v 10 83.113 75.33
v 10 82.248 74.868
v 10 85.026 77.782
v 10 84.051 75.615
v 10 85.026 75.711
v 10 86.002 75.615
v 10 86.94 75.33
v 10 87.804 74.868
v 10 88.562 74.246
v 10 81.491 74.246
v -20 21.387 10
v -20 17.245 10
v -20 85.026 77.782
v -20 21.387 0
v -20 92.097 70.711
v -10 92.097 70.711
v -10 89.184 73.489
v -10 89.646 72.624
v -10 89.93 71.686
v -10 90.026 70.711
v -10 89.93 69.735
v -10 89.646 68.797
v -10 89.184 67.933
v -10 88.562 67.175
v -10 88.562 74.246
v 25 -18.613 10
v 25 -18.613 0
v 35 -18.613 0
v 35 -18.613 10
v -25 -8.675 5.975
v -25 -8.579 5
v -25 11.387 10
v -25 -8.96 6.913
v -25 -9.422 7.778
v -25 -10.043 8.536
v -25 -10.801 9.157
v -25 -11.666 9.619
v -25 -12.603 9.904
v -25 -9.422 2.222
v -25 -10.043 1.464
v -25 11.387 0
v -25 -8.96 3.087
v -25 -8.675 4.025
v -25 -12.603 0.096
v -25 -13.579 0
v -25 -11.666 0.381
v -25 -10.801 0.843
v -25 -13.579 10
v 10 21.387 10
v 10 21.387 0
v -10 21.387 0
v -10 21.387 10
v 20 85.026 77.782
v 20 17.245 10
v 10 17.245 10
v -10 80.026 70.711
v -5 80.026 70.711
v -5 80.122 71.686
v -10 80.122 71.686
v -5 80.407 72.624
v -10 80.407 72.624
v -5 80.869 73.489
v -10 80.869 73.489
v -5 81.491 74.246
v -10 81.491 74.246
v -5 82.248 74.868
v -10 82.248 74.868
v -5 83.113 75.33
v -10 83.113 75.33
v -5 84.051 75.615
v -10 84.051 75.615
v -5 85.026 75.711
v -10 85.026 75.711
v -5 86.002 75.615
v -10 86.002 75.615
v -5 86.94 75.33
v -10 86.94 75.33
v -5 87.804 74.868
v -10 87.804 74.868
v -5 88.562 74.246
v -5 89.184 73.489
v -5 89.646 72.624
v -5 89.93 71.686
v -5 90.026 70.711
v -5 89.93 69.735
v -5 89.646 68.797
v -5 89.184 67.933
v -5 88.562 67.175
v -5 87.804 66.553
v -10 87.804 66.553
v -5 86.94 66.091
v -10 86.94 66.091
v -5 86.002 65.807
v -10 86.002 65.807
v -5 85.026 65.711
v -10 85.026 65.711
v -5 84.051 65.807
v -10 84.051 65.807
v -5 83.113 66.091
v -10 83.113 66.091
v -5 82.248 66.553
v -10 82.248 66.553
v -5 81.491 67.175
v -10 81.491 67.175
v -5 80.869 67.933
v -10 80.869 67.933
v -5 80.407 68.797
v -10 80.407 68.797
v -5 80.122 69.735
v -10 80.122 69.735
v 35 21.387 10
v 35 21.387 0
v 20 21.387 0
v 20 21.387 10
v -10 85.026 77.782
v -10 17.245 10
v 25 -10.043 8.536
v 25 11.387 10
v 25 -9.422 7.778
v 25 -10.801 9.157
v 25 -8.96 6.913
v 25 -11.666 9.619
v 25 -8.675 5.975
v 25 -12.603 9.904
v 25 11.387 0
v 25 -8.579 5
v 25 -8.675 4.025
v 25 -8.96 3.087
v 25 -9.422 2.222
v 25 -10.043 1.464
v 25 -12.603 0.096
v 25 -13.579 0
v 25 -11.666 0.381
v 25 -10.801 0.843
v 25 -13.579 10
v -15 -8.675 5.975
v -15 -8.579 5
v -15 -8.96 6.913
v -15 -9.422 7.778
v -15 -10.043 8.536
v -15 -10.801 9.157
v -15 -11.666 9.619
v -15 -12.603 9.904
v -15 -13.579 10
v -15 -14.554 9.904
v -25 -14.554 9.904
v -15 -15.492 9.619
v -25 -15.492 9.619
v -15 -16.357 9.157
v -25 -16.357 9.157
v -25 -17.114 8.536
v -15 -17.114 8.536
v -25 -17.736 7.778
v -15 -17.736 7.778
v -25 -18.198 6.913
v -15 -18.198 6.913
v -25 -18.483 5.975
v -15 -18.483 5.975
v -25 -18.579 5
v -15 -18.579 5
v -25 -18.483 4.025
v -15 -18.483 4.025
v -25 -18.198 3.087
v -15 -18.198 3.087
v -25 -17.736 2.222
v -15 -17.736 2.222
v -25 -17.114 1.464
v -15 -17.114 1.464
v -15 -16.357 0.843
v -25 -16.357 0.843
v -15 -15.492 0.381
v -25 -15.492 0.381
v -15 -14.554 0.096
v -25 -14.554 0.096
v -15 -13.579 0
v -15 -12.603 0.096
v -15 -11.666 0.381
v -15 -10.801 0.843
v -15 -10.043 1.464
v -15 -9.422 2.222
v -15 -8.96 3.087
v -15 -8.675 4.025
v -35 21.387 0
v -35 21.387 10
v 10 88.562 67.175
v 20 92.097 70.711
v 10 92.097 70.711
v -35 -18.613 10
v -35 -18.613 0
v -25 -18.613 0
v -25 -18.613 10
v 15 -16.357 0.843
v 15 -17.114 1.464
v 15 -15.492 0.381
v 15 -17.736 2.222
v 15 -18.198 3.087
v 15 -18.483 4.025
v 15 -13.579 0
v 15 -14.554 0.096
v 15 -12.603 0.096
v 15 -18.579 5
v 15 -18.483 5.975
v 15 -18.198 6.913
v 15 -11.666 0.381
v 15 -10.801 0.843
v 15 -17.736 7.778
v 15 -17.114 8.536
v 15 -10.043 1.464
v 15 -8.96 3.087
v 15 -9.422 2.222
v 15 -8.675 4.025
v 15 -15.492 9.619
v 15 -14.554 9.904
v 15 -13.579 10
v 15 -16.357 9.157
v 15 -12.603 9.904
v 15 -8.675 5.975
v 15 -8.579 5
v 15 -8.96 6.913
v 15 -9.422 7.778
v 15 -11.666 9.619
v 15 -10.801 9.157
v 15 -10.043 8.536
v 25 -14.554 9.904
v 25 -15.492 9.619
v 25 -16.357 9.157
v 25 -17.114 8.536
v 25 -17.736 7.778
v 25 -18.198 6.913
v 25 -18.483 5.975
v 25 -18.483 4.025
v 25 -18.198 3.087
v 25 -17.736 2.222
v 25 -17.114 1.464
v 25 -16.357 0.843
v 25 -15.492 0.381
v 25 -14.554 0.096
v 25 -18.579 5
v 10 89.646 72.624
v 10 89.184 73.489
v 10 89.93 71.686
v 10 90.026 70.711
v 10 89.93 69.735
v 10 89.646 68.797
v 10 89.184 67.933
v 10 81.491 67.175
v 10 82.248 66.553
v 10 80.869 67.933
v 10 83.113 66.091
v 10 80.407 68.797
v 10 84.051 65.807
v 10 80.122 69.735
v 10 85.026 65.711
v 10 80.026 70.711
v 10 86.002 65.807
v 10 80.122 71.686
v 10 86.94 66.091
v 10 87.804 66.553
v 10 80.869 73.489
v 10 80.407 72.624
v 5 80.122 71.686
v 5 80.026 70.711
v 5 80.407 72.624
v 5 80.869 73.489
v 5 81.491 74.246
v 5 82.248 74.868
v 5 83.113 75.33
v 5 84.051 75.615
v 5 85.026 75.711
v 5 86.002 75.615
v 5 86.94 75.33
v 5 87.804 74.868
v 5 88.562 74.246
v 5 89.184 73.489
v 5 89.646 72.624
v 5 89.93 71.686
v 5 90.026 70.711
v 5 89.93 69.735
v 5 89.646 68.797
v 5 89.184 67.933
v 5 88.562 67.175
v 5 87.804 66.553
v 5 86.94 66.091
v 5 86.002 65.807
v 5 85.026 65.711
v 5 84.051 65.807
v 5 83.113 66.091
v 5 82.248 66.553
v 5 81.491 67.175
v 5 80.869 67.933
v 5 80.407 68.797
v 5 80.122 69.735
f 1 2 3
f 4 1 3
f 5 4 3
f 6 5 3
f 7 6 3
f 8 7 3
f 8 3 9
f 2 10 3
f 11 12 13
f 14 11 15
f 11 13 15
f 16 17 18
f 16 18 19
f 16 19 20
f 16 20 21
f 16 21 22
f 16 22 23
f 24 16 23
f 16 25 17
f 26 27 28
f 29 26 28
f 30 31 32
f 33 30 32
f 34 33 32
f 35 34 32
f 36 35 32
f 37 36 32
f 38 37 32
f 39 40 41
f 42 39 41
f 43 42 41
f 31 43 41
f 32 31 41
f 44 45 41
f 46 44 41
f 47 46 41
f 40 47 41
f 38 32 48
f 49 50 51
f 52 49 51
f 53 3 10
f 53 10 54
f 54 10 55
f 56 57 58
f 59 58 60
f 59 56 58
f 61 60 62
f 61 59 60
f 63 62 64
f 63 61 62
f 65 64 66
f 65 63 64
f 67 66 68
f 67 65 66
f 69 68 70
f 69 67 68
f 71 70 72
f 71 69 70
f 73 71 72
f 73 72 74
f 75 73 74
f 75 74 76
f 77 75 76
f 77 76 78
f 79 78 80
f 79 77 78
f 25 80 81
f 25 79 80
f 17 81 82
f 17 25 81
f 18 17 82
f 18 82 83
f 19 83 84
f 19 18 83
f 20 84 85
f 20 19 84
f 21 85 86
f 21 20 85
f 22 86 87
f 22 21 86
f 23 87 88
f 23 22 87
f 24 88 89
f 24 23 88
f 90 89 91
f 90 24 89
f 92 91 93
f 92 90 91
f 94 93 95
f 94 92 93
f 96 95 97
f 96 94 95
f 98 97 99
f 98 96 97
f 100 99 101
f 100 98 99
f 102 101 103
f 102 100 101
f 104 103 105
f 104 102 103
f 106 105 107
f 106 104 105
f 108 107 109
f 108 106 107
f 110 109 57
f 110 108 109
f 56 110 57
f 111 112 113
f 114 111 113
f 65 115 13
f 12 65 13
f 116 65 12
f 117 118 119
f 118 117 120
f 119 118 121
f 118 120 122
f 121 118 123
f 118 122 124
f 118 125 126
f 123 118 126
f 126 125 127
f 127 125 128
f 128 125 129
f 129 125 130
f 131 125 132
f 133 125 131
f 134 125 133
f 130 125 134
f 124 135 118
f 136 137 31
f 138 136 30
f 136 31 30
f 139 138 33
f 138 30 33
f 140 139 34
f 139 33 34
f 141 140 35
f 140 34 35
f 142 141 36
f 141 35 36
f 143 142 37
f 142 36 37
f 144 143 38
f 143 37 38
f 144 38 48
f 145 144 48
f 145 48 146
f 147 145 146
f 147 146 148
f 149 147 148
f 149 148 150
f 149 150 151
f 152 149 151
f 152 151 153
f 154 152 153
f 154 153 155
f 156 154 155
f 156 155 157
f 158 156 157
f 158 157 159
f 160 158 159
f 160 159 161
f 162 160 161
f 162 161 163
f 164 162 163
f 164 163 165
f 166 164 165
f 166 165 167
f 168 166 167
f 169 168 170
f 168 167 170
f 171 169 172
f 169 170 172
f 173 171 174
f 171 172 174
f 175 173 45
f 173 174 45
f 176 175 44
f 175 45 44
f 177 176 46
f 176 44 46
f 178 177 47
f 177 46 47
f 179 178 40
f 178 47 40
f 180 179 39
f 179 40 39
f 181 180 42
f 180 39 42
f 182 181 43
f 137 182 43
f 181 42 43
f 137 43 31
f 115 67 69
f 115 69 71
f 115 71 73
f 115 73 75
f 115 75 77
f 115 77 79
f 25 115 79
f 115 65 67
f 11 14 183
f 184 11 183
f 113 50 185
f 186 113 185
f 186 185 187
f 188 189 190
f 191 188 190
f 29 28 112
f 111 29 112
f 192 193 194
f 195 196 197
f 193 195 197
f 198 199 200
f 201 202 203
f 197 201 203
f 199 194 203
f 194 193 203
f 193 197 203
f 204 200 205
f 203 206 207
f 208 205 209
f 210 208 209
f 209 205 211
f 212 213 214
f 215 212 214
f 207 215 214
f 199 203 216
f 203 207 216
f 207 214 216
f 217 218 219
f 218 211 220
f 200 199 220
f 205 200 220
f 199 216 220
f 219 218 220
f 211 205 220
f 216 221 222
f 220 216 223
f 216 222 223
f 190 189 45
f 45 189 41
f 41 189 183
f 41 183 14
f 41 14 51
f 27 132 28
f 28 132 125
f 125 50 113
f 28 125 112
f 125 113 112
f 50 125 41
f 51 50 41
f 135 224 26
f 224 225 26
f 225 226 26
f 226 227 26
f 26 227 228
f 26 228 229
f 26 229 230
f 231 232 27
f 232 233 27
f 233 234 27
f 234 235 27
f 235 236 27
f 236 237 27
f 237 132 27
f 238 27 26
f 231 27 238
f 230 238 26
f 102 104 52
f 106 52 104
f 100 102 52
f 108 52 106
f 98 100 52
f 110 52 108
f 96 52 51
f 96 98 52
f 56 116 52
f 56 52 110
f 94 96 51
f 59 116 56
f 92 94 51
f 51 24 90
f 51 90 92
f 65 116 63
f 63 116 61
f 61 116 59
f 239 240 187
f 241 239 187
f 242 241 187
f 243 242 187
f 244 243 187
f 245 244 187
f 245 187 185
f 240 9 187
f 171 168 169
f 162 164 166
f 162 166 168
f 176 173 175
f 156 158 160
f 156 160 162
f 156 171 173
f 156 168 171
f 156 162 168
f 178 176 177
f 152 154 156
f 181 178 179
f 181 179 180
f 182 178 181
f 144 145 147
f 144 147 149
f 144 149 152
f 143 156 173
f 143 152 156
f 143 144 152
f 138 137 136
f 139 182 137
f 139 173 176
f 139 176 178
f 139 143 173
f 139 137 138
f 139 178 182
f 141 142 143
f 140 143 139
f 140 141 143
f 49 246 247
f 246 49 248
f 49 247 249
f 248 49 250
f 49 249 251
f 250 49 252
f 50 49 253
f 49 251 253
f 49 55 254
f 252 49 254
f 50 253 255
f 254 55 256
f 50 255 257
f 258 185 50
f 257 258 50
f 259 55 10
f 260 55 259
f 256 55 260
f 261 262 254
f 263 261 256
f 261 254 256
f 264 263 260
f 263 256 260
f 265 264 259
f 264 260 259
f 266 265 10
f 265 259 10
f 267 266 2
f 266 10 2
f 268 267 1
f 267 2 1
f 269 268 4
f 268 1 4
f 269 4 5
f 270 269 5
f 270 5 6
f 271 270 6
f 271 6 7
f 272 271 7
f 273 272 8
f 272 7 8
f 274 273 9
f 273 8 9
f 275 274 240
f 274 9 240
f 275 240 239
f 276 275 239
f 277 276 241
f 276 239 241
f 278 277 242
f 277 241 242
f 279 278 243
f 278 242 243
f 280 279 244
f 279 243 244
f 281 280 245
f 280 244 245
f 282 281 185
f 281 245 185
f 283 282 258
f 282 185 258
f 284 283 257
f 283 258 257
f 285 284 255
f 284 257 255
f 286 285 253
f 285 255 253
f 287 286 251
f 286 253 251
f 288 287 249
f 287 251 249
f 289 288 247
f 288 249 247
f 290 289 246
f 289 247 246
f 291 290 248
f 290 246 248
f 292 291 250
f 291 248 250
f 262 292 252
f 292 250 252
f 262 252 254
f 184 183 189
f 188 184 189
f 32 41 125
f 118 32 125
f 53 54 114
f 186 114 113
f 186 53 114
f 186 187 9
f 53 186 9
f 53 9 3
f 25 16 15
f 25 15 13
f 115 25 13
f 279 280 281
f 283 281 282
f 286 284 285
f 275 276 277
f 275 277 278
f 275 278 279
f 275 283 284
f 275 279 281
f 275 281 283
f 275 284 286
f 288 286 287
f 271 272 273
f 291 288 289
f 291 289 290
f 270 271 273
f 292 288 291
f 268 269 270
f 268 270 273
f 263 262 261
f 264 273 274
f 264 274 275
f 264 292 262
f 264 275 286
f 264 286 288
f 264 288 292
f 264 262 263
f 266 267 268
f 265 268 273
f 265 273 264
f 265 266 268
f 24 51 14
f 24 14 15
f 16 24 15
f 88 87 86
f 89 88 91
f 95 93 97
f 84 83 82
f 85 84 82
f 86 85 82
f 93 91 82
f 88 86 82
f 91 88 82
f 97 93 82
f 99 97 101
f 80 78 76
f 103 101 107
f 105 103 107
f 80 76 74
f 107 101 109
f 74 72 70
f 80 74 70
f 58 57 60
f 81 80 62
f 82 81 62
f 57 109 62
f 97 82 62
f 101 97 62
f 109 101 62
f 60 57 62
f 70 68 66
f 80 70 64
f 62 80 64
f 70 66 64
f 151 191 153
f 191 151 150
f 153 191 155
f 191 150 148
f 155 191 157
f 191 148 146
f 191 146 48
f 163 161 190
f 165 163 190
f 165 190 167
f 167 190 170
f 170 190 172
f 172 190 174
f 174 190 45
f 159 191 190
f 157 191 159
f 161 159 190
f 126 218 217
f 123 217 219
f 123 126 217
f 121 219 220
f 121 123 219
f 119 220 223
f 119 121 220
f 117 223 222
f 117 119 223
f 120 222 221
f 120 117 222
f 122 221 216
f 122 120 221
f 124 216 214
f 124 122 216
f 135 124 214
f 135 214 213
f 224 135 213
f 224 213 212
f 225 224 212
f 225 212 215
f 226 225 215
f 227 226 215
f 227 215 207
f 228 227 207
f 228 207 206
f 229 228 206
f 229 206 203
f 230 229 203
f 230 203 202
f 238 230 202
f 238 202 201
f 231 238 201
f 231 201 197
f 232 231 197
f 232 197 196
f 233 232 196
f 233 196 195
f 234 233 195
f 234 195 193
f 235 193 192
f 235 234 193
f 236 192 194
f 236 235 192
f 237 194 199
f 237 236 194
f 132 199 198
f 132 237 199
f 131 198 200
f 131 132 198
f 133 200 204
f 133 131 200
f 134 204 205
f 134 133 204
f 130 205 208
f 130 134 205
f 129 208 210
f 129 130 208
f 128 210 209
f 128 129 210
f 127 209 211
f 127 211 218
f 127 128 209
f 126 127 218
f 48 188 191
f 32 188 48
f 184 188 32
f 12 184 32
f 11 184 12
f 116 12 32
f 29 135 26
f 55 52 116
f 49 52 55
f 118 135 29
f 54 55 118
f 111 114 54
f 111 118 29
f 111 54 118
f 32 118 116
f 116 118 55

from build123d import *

# Parameters (mm, degrees)
F1_DEPTH = 10
F2_R     = 5
F3_DEPTH = 10
F7_DEPTH = 10
F8_R     = 5
F9_DEPTH = 5


with BuildPart() as f1:
    # F0 (on Top) → F1 (new body)
    with BuildSketch(Plane.XY):
        Polygon((-35, -18.6133389152), (-25, -18.6133389152), (-25, -8.6133389152), (-25, 11.3866610848), (25, 11.3866610848), (25, -8.6133389152), (25, -18.6133389152), (35, -18.6133389152), (35, 21.3866610848), (-35, 21.3866610848), align=None)
    extrude(amount=F1_DEPTH)

    # F2 (on face) → F3 (join)
    with BuildSketch(Plane.YZ.offset(-25)):
        with Locations((-13.5789485648, 5)):
            Circle(F2_R)
    extrude(amount=F3_DEPTH)

    # F4: F1 across plane


with BuildPart() as f1_1:
    add(f1.part)
    add(f1.part.mirror(Plane.YZ))

    # F6 (on offset) → F7 (join)
    with BuildSketch(Plane.YZ.offset(10)):
        Polygon((14.3155932729, 7.0710678119), (21.3866610848, 0), (92.0973392034, 70.7106781187), (85.0262713916, 77.7817459305), align=None)
    extrude(amount=F7_DEPTH)

    # F8 (on face) → F9 (join)
    with BuildSketch(Plane(origin=(10, 0, 0), x_dir=(0, -1, 0), z_dir=(-1, 0, 0))):
        with Locations((-85.0262713916, 70.7106781187)):
            Circle(F8_R)
    extrude(amount=F9_DEPTH)

    # F10: F1 across plane


with BuildPart() as f1_2:
    add(f1_1.part)
    add(f1_1.part.mirror(Plane.YZ))


solid = f1_2.part
